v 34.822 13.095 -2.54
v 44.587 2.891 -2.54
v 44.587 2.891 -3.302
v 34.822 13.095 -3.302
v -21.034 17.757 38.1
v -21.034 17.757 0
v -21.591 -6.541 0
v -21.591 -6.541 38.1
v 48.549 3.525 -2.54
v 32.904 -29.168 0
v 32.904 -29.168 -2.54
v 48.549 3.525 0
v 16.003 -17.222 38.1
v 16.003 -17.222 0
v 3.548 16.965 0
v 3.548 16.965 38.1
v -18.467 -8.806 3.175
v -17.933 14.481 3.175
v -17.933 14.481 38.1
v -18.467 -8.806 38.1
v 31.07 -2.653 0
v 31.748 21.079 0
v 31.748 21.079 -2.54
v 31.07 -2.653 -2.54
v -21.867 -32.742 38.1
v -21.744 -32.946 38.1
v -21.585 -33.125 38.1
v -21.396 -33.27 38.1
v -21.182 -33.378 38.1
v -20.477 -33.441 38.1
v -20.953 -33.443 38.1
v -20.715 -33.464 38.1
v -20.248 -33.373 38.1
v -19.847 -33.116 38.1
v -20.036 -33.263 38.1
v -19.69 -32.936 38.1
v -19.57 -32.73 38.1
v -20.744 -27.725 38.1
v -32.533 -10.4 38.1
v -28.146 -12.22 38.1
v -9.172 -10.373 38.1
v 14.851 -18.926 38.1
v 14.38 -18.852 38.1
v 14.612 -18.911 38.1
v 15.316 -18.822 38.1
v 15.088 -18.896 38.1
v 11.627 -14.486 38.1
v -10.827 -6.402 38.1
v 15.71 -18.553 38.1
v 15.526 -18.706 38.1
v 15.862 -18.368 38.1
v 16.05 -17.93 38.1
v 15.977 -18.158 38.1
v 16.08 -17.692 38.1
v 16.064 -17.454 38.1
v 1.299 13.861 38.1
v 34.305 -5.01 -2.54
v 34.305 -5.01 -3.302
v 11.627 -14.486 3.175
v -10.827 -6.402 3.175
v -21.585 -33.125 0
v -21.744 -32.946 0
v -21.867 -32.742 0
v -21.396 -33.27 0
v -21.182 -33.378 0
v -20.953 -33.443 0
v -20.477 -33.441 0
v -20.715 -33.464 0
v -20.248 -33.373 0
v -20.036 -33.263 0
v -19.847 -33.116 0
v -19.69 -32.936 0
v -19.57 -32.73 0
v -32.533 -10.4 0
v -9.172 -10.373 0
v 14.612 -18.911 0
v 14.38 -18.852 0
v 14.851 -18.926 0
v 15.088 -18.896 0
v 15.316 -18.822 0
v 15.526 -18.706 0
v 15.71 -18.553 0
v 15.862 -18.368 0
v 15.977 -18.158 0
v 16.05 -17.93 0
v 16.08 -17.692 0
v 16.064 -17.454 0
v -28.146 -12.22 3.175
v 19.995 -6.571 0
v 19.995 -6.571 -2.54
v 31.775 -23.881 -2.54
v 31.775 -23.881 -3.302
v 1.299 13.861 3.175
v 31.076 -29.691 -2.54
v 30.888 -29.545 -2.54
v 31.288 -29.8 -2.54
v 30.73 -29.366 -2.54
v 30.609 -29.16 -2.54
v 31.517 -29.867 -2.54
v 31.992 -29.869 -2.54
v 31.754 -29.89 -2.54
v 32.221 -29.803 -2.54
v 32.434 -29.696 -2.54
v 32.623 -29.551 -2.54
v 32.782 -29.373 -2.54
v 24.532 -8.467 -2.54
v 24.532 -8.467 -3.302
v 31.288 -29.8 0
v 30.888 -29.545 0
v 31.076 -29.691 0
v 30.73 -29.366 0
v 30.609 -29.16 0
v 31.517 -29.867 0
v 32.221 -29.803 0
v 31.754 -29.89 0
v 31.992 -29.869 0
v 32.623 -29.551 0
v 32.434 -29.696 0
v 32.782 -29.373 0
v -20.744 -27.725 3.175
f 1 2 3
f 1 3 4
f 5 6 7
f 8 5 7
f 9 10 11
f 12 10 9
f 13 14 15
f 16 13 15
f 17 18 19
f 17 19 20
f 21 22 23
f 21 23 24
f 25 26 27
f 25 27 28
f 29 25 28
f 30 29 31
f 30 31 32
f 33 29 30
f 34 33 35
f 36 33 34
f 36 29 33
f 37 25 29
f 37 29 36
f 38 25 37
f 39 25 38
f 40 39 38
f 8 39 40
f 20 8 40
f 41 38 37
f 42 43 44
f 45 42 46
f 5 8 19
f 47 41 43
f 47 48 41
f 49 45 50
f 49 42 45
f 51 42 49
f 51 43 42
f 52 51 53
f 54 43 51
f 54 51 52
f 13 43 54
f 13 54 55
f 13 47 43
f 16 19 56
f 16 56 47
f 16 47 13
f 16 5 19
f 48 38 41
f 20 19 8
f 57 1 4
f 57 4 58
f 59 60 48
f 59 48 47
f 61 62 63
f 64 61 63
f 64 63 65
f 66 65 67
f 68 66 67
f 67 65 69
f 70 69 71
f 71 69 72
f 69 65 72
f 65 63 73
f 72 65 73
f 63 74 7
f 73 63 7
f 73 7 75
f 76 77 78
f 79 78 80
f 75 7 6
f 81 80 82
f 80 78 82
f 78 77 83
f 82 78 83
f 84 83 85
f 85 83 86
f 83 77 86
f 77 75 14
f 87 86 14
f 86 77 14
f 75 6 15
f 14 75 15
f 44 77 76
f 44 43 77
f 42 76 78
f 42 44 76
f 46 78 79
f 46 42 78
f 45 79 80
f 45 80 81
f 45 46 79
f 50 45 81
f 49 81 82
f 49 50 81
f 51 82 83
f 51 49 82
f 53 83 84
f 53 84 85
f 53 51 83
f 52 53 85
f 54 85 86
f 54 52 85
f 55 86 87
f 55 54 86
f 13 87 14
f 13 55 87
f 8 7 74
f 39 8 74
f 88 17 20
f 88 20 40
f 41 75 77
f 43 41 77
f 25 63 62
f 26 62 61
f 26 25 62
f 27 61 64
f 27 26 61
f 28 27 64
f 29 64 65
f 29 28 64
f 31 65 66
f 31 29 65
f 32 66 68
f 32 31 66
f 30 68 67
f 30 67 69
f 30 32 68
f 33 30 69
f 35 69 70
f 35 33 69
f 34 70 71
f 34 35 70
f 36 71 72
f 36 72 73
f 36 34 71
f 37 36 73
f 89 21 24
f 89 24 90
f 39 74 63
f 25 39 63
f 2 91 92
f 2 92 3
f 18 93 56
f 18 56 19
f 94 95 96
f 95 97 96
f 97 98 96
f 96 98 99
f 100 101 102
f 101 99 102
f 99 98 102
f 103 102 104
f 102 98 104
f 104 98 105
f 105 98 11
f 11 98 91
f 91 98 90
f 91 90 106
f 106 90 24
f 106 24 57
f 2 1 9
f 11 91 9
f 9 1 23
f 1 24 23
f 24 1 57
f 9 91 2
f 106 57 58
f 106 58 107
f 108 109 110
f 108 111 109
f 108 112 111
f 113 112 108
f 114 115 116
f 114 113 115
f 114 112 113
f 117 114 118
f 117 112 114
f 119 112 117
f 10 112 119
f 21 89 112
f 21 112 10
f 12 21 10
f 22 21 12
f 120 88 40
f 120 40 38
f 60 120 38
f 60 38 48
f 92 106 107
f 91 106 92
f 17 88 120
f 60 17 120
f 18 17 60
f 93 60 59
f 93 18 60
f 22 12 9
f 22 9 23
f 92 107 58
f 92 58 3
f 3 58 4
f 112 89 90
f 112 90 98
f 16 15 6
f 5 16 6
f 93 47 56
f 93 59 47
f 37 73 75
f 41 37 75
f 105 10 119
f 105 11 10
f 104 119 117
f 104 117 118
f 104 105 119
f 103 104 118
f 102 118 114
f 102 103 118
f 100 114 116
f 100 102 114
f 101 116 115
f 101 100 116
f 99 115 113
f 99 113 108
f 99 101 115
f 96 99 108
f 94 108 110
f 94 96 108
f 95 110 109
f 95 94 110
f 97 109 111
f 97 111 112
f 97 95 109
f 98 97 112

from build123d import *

# Parameters (mm, degrees)
F1_DEPTH = 3.302
F2_DEPTH = 2.54
F3_DEPTH = 38.1
F4_T     = -3.175
F5_R     = 1.27
F5_2_R   = 1.27


with BuildPart() as f1:
    # F0 (on Top) → F1 (new body)
    with BuildSketch(Plane.XY):
        Polygon((31.7754910534, -23.8814431078), (44.5872922283, 2.8911981838), (34.8218606061, 13.0945404164), (34.3045931908, -5.0098487842), (24.5324072206, -8.4666758999), align=None)
    extrude(amount=-F1_DEPTH)

    # F0 (on Top) → F2 (join)
    with BuildSketch(Plane.XY):
        Polygon((48.5493056476, 3.5247709602), (31.7482575774, 21.0792273283), (31.0701895505, -2.6531924959), (19.9950579554, -6.5709254704), (31.7482575774, -31.5841436386), align=None)
        Polygon((34.8218606061, 13.0945404164), (44.5872922283, 2.8911981838), (31.7754910534, -23.8814431078), (24.5324072206, -8.4666758999), (34.3045931908, -5.0098487842), align=None, mode=Mode.SUBTRACT)
    extrude(amount=-F2_DEPTH)

    # F5#2
    f5_2_edges = [f1.edges().sort_by_distance(p)[0] for p in [
        (31.748258, -31.584144, -1.27),
    ]]
    fillet(f5_2_edges, radius=F5_2_R)


with BuildPart() as f3:
    # F0 (on Top) → F3 (new body)
    with BuildSketch(Plane.XY):
        Polygon((3.5475699697, 16.965245828), (-21.034207195, 17.7572779357), (-21.590994671, -6.5409359522), (-32.5327776372, -10.4004116729), (-20.7060948014, -35.1737290621), (-9.1722095385, -10.3727914393), (16.9318206608, -19.7702404112), align=None)
    extrude(amount=F3_DEPTH)

    # F4
    f4_openings = [f3.faces().sort_by_distance(p)[0] for p in [
        (-8.886492, -3.880467, 38.1),
    ]]
    offset(amount=F4_T, openings=f4_openings, kind=Kind.INTERSECTION)

    # F5
    f5_edges = [f3.edges().sort_by_distance(p)[0] for p in [
        (-20.706095, -35.173729, 19.05),
        (16.931821, -19.77024, 19.05),
    ]]
    fillet(f5_edges, radius=F5_R)


solid = Compound([f1.part, f3.part])
